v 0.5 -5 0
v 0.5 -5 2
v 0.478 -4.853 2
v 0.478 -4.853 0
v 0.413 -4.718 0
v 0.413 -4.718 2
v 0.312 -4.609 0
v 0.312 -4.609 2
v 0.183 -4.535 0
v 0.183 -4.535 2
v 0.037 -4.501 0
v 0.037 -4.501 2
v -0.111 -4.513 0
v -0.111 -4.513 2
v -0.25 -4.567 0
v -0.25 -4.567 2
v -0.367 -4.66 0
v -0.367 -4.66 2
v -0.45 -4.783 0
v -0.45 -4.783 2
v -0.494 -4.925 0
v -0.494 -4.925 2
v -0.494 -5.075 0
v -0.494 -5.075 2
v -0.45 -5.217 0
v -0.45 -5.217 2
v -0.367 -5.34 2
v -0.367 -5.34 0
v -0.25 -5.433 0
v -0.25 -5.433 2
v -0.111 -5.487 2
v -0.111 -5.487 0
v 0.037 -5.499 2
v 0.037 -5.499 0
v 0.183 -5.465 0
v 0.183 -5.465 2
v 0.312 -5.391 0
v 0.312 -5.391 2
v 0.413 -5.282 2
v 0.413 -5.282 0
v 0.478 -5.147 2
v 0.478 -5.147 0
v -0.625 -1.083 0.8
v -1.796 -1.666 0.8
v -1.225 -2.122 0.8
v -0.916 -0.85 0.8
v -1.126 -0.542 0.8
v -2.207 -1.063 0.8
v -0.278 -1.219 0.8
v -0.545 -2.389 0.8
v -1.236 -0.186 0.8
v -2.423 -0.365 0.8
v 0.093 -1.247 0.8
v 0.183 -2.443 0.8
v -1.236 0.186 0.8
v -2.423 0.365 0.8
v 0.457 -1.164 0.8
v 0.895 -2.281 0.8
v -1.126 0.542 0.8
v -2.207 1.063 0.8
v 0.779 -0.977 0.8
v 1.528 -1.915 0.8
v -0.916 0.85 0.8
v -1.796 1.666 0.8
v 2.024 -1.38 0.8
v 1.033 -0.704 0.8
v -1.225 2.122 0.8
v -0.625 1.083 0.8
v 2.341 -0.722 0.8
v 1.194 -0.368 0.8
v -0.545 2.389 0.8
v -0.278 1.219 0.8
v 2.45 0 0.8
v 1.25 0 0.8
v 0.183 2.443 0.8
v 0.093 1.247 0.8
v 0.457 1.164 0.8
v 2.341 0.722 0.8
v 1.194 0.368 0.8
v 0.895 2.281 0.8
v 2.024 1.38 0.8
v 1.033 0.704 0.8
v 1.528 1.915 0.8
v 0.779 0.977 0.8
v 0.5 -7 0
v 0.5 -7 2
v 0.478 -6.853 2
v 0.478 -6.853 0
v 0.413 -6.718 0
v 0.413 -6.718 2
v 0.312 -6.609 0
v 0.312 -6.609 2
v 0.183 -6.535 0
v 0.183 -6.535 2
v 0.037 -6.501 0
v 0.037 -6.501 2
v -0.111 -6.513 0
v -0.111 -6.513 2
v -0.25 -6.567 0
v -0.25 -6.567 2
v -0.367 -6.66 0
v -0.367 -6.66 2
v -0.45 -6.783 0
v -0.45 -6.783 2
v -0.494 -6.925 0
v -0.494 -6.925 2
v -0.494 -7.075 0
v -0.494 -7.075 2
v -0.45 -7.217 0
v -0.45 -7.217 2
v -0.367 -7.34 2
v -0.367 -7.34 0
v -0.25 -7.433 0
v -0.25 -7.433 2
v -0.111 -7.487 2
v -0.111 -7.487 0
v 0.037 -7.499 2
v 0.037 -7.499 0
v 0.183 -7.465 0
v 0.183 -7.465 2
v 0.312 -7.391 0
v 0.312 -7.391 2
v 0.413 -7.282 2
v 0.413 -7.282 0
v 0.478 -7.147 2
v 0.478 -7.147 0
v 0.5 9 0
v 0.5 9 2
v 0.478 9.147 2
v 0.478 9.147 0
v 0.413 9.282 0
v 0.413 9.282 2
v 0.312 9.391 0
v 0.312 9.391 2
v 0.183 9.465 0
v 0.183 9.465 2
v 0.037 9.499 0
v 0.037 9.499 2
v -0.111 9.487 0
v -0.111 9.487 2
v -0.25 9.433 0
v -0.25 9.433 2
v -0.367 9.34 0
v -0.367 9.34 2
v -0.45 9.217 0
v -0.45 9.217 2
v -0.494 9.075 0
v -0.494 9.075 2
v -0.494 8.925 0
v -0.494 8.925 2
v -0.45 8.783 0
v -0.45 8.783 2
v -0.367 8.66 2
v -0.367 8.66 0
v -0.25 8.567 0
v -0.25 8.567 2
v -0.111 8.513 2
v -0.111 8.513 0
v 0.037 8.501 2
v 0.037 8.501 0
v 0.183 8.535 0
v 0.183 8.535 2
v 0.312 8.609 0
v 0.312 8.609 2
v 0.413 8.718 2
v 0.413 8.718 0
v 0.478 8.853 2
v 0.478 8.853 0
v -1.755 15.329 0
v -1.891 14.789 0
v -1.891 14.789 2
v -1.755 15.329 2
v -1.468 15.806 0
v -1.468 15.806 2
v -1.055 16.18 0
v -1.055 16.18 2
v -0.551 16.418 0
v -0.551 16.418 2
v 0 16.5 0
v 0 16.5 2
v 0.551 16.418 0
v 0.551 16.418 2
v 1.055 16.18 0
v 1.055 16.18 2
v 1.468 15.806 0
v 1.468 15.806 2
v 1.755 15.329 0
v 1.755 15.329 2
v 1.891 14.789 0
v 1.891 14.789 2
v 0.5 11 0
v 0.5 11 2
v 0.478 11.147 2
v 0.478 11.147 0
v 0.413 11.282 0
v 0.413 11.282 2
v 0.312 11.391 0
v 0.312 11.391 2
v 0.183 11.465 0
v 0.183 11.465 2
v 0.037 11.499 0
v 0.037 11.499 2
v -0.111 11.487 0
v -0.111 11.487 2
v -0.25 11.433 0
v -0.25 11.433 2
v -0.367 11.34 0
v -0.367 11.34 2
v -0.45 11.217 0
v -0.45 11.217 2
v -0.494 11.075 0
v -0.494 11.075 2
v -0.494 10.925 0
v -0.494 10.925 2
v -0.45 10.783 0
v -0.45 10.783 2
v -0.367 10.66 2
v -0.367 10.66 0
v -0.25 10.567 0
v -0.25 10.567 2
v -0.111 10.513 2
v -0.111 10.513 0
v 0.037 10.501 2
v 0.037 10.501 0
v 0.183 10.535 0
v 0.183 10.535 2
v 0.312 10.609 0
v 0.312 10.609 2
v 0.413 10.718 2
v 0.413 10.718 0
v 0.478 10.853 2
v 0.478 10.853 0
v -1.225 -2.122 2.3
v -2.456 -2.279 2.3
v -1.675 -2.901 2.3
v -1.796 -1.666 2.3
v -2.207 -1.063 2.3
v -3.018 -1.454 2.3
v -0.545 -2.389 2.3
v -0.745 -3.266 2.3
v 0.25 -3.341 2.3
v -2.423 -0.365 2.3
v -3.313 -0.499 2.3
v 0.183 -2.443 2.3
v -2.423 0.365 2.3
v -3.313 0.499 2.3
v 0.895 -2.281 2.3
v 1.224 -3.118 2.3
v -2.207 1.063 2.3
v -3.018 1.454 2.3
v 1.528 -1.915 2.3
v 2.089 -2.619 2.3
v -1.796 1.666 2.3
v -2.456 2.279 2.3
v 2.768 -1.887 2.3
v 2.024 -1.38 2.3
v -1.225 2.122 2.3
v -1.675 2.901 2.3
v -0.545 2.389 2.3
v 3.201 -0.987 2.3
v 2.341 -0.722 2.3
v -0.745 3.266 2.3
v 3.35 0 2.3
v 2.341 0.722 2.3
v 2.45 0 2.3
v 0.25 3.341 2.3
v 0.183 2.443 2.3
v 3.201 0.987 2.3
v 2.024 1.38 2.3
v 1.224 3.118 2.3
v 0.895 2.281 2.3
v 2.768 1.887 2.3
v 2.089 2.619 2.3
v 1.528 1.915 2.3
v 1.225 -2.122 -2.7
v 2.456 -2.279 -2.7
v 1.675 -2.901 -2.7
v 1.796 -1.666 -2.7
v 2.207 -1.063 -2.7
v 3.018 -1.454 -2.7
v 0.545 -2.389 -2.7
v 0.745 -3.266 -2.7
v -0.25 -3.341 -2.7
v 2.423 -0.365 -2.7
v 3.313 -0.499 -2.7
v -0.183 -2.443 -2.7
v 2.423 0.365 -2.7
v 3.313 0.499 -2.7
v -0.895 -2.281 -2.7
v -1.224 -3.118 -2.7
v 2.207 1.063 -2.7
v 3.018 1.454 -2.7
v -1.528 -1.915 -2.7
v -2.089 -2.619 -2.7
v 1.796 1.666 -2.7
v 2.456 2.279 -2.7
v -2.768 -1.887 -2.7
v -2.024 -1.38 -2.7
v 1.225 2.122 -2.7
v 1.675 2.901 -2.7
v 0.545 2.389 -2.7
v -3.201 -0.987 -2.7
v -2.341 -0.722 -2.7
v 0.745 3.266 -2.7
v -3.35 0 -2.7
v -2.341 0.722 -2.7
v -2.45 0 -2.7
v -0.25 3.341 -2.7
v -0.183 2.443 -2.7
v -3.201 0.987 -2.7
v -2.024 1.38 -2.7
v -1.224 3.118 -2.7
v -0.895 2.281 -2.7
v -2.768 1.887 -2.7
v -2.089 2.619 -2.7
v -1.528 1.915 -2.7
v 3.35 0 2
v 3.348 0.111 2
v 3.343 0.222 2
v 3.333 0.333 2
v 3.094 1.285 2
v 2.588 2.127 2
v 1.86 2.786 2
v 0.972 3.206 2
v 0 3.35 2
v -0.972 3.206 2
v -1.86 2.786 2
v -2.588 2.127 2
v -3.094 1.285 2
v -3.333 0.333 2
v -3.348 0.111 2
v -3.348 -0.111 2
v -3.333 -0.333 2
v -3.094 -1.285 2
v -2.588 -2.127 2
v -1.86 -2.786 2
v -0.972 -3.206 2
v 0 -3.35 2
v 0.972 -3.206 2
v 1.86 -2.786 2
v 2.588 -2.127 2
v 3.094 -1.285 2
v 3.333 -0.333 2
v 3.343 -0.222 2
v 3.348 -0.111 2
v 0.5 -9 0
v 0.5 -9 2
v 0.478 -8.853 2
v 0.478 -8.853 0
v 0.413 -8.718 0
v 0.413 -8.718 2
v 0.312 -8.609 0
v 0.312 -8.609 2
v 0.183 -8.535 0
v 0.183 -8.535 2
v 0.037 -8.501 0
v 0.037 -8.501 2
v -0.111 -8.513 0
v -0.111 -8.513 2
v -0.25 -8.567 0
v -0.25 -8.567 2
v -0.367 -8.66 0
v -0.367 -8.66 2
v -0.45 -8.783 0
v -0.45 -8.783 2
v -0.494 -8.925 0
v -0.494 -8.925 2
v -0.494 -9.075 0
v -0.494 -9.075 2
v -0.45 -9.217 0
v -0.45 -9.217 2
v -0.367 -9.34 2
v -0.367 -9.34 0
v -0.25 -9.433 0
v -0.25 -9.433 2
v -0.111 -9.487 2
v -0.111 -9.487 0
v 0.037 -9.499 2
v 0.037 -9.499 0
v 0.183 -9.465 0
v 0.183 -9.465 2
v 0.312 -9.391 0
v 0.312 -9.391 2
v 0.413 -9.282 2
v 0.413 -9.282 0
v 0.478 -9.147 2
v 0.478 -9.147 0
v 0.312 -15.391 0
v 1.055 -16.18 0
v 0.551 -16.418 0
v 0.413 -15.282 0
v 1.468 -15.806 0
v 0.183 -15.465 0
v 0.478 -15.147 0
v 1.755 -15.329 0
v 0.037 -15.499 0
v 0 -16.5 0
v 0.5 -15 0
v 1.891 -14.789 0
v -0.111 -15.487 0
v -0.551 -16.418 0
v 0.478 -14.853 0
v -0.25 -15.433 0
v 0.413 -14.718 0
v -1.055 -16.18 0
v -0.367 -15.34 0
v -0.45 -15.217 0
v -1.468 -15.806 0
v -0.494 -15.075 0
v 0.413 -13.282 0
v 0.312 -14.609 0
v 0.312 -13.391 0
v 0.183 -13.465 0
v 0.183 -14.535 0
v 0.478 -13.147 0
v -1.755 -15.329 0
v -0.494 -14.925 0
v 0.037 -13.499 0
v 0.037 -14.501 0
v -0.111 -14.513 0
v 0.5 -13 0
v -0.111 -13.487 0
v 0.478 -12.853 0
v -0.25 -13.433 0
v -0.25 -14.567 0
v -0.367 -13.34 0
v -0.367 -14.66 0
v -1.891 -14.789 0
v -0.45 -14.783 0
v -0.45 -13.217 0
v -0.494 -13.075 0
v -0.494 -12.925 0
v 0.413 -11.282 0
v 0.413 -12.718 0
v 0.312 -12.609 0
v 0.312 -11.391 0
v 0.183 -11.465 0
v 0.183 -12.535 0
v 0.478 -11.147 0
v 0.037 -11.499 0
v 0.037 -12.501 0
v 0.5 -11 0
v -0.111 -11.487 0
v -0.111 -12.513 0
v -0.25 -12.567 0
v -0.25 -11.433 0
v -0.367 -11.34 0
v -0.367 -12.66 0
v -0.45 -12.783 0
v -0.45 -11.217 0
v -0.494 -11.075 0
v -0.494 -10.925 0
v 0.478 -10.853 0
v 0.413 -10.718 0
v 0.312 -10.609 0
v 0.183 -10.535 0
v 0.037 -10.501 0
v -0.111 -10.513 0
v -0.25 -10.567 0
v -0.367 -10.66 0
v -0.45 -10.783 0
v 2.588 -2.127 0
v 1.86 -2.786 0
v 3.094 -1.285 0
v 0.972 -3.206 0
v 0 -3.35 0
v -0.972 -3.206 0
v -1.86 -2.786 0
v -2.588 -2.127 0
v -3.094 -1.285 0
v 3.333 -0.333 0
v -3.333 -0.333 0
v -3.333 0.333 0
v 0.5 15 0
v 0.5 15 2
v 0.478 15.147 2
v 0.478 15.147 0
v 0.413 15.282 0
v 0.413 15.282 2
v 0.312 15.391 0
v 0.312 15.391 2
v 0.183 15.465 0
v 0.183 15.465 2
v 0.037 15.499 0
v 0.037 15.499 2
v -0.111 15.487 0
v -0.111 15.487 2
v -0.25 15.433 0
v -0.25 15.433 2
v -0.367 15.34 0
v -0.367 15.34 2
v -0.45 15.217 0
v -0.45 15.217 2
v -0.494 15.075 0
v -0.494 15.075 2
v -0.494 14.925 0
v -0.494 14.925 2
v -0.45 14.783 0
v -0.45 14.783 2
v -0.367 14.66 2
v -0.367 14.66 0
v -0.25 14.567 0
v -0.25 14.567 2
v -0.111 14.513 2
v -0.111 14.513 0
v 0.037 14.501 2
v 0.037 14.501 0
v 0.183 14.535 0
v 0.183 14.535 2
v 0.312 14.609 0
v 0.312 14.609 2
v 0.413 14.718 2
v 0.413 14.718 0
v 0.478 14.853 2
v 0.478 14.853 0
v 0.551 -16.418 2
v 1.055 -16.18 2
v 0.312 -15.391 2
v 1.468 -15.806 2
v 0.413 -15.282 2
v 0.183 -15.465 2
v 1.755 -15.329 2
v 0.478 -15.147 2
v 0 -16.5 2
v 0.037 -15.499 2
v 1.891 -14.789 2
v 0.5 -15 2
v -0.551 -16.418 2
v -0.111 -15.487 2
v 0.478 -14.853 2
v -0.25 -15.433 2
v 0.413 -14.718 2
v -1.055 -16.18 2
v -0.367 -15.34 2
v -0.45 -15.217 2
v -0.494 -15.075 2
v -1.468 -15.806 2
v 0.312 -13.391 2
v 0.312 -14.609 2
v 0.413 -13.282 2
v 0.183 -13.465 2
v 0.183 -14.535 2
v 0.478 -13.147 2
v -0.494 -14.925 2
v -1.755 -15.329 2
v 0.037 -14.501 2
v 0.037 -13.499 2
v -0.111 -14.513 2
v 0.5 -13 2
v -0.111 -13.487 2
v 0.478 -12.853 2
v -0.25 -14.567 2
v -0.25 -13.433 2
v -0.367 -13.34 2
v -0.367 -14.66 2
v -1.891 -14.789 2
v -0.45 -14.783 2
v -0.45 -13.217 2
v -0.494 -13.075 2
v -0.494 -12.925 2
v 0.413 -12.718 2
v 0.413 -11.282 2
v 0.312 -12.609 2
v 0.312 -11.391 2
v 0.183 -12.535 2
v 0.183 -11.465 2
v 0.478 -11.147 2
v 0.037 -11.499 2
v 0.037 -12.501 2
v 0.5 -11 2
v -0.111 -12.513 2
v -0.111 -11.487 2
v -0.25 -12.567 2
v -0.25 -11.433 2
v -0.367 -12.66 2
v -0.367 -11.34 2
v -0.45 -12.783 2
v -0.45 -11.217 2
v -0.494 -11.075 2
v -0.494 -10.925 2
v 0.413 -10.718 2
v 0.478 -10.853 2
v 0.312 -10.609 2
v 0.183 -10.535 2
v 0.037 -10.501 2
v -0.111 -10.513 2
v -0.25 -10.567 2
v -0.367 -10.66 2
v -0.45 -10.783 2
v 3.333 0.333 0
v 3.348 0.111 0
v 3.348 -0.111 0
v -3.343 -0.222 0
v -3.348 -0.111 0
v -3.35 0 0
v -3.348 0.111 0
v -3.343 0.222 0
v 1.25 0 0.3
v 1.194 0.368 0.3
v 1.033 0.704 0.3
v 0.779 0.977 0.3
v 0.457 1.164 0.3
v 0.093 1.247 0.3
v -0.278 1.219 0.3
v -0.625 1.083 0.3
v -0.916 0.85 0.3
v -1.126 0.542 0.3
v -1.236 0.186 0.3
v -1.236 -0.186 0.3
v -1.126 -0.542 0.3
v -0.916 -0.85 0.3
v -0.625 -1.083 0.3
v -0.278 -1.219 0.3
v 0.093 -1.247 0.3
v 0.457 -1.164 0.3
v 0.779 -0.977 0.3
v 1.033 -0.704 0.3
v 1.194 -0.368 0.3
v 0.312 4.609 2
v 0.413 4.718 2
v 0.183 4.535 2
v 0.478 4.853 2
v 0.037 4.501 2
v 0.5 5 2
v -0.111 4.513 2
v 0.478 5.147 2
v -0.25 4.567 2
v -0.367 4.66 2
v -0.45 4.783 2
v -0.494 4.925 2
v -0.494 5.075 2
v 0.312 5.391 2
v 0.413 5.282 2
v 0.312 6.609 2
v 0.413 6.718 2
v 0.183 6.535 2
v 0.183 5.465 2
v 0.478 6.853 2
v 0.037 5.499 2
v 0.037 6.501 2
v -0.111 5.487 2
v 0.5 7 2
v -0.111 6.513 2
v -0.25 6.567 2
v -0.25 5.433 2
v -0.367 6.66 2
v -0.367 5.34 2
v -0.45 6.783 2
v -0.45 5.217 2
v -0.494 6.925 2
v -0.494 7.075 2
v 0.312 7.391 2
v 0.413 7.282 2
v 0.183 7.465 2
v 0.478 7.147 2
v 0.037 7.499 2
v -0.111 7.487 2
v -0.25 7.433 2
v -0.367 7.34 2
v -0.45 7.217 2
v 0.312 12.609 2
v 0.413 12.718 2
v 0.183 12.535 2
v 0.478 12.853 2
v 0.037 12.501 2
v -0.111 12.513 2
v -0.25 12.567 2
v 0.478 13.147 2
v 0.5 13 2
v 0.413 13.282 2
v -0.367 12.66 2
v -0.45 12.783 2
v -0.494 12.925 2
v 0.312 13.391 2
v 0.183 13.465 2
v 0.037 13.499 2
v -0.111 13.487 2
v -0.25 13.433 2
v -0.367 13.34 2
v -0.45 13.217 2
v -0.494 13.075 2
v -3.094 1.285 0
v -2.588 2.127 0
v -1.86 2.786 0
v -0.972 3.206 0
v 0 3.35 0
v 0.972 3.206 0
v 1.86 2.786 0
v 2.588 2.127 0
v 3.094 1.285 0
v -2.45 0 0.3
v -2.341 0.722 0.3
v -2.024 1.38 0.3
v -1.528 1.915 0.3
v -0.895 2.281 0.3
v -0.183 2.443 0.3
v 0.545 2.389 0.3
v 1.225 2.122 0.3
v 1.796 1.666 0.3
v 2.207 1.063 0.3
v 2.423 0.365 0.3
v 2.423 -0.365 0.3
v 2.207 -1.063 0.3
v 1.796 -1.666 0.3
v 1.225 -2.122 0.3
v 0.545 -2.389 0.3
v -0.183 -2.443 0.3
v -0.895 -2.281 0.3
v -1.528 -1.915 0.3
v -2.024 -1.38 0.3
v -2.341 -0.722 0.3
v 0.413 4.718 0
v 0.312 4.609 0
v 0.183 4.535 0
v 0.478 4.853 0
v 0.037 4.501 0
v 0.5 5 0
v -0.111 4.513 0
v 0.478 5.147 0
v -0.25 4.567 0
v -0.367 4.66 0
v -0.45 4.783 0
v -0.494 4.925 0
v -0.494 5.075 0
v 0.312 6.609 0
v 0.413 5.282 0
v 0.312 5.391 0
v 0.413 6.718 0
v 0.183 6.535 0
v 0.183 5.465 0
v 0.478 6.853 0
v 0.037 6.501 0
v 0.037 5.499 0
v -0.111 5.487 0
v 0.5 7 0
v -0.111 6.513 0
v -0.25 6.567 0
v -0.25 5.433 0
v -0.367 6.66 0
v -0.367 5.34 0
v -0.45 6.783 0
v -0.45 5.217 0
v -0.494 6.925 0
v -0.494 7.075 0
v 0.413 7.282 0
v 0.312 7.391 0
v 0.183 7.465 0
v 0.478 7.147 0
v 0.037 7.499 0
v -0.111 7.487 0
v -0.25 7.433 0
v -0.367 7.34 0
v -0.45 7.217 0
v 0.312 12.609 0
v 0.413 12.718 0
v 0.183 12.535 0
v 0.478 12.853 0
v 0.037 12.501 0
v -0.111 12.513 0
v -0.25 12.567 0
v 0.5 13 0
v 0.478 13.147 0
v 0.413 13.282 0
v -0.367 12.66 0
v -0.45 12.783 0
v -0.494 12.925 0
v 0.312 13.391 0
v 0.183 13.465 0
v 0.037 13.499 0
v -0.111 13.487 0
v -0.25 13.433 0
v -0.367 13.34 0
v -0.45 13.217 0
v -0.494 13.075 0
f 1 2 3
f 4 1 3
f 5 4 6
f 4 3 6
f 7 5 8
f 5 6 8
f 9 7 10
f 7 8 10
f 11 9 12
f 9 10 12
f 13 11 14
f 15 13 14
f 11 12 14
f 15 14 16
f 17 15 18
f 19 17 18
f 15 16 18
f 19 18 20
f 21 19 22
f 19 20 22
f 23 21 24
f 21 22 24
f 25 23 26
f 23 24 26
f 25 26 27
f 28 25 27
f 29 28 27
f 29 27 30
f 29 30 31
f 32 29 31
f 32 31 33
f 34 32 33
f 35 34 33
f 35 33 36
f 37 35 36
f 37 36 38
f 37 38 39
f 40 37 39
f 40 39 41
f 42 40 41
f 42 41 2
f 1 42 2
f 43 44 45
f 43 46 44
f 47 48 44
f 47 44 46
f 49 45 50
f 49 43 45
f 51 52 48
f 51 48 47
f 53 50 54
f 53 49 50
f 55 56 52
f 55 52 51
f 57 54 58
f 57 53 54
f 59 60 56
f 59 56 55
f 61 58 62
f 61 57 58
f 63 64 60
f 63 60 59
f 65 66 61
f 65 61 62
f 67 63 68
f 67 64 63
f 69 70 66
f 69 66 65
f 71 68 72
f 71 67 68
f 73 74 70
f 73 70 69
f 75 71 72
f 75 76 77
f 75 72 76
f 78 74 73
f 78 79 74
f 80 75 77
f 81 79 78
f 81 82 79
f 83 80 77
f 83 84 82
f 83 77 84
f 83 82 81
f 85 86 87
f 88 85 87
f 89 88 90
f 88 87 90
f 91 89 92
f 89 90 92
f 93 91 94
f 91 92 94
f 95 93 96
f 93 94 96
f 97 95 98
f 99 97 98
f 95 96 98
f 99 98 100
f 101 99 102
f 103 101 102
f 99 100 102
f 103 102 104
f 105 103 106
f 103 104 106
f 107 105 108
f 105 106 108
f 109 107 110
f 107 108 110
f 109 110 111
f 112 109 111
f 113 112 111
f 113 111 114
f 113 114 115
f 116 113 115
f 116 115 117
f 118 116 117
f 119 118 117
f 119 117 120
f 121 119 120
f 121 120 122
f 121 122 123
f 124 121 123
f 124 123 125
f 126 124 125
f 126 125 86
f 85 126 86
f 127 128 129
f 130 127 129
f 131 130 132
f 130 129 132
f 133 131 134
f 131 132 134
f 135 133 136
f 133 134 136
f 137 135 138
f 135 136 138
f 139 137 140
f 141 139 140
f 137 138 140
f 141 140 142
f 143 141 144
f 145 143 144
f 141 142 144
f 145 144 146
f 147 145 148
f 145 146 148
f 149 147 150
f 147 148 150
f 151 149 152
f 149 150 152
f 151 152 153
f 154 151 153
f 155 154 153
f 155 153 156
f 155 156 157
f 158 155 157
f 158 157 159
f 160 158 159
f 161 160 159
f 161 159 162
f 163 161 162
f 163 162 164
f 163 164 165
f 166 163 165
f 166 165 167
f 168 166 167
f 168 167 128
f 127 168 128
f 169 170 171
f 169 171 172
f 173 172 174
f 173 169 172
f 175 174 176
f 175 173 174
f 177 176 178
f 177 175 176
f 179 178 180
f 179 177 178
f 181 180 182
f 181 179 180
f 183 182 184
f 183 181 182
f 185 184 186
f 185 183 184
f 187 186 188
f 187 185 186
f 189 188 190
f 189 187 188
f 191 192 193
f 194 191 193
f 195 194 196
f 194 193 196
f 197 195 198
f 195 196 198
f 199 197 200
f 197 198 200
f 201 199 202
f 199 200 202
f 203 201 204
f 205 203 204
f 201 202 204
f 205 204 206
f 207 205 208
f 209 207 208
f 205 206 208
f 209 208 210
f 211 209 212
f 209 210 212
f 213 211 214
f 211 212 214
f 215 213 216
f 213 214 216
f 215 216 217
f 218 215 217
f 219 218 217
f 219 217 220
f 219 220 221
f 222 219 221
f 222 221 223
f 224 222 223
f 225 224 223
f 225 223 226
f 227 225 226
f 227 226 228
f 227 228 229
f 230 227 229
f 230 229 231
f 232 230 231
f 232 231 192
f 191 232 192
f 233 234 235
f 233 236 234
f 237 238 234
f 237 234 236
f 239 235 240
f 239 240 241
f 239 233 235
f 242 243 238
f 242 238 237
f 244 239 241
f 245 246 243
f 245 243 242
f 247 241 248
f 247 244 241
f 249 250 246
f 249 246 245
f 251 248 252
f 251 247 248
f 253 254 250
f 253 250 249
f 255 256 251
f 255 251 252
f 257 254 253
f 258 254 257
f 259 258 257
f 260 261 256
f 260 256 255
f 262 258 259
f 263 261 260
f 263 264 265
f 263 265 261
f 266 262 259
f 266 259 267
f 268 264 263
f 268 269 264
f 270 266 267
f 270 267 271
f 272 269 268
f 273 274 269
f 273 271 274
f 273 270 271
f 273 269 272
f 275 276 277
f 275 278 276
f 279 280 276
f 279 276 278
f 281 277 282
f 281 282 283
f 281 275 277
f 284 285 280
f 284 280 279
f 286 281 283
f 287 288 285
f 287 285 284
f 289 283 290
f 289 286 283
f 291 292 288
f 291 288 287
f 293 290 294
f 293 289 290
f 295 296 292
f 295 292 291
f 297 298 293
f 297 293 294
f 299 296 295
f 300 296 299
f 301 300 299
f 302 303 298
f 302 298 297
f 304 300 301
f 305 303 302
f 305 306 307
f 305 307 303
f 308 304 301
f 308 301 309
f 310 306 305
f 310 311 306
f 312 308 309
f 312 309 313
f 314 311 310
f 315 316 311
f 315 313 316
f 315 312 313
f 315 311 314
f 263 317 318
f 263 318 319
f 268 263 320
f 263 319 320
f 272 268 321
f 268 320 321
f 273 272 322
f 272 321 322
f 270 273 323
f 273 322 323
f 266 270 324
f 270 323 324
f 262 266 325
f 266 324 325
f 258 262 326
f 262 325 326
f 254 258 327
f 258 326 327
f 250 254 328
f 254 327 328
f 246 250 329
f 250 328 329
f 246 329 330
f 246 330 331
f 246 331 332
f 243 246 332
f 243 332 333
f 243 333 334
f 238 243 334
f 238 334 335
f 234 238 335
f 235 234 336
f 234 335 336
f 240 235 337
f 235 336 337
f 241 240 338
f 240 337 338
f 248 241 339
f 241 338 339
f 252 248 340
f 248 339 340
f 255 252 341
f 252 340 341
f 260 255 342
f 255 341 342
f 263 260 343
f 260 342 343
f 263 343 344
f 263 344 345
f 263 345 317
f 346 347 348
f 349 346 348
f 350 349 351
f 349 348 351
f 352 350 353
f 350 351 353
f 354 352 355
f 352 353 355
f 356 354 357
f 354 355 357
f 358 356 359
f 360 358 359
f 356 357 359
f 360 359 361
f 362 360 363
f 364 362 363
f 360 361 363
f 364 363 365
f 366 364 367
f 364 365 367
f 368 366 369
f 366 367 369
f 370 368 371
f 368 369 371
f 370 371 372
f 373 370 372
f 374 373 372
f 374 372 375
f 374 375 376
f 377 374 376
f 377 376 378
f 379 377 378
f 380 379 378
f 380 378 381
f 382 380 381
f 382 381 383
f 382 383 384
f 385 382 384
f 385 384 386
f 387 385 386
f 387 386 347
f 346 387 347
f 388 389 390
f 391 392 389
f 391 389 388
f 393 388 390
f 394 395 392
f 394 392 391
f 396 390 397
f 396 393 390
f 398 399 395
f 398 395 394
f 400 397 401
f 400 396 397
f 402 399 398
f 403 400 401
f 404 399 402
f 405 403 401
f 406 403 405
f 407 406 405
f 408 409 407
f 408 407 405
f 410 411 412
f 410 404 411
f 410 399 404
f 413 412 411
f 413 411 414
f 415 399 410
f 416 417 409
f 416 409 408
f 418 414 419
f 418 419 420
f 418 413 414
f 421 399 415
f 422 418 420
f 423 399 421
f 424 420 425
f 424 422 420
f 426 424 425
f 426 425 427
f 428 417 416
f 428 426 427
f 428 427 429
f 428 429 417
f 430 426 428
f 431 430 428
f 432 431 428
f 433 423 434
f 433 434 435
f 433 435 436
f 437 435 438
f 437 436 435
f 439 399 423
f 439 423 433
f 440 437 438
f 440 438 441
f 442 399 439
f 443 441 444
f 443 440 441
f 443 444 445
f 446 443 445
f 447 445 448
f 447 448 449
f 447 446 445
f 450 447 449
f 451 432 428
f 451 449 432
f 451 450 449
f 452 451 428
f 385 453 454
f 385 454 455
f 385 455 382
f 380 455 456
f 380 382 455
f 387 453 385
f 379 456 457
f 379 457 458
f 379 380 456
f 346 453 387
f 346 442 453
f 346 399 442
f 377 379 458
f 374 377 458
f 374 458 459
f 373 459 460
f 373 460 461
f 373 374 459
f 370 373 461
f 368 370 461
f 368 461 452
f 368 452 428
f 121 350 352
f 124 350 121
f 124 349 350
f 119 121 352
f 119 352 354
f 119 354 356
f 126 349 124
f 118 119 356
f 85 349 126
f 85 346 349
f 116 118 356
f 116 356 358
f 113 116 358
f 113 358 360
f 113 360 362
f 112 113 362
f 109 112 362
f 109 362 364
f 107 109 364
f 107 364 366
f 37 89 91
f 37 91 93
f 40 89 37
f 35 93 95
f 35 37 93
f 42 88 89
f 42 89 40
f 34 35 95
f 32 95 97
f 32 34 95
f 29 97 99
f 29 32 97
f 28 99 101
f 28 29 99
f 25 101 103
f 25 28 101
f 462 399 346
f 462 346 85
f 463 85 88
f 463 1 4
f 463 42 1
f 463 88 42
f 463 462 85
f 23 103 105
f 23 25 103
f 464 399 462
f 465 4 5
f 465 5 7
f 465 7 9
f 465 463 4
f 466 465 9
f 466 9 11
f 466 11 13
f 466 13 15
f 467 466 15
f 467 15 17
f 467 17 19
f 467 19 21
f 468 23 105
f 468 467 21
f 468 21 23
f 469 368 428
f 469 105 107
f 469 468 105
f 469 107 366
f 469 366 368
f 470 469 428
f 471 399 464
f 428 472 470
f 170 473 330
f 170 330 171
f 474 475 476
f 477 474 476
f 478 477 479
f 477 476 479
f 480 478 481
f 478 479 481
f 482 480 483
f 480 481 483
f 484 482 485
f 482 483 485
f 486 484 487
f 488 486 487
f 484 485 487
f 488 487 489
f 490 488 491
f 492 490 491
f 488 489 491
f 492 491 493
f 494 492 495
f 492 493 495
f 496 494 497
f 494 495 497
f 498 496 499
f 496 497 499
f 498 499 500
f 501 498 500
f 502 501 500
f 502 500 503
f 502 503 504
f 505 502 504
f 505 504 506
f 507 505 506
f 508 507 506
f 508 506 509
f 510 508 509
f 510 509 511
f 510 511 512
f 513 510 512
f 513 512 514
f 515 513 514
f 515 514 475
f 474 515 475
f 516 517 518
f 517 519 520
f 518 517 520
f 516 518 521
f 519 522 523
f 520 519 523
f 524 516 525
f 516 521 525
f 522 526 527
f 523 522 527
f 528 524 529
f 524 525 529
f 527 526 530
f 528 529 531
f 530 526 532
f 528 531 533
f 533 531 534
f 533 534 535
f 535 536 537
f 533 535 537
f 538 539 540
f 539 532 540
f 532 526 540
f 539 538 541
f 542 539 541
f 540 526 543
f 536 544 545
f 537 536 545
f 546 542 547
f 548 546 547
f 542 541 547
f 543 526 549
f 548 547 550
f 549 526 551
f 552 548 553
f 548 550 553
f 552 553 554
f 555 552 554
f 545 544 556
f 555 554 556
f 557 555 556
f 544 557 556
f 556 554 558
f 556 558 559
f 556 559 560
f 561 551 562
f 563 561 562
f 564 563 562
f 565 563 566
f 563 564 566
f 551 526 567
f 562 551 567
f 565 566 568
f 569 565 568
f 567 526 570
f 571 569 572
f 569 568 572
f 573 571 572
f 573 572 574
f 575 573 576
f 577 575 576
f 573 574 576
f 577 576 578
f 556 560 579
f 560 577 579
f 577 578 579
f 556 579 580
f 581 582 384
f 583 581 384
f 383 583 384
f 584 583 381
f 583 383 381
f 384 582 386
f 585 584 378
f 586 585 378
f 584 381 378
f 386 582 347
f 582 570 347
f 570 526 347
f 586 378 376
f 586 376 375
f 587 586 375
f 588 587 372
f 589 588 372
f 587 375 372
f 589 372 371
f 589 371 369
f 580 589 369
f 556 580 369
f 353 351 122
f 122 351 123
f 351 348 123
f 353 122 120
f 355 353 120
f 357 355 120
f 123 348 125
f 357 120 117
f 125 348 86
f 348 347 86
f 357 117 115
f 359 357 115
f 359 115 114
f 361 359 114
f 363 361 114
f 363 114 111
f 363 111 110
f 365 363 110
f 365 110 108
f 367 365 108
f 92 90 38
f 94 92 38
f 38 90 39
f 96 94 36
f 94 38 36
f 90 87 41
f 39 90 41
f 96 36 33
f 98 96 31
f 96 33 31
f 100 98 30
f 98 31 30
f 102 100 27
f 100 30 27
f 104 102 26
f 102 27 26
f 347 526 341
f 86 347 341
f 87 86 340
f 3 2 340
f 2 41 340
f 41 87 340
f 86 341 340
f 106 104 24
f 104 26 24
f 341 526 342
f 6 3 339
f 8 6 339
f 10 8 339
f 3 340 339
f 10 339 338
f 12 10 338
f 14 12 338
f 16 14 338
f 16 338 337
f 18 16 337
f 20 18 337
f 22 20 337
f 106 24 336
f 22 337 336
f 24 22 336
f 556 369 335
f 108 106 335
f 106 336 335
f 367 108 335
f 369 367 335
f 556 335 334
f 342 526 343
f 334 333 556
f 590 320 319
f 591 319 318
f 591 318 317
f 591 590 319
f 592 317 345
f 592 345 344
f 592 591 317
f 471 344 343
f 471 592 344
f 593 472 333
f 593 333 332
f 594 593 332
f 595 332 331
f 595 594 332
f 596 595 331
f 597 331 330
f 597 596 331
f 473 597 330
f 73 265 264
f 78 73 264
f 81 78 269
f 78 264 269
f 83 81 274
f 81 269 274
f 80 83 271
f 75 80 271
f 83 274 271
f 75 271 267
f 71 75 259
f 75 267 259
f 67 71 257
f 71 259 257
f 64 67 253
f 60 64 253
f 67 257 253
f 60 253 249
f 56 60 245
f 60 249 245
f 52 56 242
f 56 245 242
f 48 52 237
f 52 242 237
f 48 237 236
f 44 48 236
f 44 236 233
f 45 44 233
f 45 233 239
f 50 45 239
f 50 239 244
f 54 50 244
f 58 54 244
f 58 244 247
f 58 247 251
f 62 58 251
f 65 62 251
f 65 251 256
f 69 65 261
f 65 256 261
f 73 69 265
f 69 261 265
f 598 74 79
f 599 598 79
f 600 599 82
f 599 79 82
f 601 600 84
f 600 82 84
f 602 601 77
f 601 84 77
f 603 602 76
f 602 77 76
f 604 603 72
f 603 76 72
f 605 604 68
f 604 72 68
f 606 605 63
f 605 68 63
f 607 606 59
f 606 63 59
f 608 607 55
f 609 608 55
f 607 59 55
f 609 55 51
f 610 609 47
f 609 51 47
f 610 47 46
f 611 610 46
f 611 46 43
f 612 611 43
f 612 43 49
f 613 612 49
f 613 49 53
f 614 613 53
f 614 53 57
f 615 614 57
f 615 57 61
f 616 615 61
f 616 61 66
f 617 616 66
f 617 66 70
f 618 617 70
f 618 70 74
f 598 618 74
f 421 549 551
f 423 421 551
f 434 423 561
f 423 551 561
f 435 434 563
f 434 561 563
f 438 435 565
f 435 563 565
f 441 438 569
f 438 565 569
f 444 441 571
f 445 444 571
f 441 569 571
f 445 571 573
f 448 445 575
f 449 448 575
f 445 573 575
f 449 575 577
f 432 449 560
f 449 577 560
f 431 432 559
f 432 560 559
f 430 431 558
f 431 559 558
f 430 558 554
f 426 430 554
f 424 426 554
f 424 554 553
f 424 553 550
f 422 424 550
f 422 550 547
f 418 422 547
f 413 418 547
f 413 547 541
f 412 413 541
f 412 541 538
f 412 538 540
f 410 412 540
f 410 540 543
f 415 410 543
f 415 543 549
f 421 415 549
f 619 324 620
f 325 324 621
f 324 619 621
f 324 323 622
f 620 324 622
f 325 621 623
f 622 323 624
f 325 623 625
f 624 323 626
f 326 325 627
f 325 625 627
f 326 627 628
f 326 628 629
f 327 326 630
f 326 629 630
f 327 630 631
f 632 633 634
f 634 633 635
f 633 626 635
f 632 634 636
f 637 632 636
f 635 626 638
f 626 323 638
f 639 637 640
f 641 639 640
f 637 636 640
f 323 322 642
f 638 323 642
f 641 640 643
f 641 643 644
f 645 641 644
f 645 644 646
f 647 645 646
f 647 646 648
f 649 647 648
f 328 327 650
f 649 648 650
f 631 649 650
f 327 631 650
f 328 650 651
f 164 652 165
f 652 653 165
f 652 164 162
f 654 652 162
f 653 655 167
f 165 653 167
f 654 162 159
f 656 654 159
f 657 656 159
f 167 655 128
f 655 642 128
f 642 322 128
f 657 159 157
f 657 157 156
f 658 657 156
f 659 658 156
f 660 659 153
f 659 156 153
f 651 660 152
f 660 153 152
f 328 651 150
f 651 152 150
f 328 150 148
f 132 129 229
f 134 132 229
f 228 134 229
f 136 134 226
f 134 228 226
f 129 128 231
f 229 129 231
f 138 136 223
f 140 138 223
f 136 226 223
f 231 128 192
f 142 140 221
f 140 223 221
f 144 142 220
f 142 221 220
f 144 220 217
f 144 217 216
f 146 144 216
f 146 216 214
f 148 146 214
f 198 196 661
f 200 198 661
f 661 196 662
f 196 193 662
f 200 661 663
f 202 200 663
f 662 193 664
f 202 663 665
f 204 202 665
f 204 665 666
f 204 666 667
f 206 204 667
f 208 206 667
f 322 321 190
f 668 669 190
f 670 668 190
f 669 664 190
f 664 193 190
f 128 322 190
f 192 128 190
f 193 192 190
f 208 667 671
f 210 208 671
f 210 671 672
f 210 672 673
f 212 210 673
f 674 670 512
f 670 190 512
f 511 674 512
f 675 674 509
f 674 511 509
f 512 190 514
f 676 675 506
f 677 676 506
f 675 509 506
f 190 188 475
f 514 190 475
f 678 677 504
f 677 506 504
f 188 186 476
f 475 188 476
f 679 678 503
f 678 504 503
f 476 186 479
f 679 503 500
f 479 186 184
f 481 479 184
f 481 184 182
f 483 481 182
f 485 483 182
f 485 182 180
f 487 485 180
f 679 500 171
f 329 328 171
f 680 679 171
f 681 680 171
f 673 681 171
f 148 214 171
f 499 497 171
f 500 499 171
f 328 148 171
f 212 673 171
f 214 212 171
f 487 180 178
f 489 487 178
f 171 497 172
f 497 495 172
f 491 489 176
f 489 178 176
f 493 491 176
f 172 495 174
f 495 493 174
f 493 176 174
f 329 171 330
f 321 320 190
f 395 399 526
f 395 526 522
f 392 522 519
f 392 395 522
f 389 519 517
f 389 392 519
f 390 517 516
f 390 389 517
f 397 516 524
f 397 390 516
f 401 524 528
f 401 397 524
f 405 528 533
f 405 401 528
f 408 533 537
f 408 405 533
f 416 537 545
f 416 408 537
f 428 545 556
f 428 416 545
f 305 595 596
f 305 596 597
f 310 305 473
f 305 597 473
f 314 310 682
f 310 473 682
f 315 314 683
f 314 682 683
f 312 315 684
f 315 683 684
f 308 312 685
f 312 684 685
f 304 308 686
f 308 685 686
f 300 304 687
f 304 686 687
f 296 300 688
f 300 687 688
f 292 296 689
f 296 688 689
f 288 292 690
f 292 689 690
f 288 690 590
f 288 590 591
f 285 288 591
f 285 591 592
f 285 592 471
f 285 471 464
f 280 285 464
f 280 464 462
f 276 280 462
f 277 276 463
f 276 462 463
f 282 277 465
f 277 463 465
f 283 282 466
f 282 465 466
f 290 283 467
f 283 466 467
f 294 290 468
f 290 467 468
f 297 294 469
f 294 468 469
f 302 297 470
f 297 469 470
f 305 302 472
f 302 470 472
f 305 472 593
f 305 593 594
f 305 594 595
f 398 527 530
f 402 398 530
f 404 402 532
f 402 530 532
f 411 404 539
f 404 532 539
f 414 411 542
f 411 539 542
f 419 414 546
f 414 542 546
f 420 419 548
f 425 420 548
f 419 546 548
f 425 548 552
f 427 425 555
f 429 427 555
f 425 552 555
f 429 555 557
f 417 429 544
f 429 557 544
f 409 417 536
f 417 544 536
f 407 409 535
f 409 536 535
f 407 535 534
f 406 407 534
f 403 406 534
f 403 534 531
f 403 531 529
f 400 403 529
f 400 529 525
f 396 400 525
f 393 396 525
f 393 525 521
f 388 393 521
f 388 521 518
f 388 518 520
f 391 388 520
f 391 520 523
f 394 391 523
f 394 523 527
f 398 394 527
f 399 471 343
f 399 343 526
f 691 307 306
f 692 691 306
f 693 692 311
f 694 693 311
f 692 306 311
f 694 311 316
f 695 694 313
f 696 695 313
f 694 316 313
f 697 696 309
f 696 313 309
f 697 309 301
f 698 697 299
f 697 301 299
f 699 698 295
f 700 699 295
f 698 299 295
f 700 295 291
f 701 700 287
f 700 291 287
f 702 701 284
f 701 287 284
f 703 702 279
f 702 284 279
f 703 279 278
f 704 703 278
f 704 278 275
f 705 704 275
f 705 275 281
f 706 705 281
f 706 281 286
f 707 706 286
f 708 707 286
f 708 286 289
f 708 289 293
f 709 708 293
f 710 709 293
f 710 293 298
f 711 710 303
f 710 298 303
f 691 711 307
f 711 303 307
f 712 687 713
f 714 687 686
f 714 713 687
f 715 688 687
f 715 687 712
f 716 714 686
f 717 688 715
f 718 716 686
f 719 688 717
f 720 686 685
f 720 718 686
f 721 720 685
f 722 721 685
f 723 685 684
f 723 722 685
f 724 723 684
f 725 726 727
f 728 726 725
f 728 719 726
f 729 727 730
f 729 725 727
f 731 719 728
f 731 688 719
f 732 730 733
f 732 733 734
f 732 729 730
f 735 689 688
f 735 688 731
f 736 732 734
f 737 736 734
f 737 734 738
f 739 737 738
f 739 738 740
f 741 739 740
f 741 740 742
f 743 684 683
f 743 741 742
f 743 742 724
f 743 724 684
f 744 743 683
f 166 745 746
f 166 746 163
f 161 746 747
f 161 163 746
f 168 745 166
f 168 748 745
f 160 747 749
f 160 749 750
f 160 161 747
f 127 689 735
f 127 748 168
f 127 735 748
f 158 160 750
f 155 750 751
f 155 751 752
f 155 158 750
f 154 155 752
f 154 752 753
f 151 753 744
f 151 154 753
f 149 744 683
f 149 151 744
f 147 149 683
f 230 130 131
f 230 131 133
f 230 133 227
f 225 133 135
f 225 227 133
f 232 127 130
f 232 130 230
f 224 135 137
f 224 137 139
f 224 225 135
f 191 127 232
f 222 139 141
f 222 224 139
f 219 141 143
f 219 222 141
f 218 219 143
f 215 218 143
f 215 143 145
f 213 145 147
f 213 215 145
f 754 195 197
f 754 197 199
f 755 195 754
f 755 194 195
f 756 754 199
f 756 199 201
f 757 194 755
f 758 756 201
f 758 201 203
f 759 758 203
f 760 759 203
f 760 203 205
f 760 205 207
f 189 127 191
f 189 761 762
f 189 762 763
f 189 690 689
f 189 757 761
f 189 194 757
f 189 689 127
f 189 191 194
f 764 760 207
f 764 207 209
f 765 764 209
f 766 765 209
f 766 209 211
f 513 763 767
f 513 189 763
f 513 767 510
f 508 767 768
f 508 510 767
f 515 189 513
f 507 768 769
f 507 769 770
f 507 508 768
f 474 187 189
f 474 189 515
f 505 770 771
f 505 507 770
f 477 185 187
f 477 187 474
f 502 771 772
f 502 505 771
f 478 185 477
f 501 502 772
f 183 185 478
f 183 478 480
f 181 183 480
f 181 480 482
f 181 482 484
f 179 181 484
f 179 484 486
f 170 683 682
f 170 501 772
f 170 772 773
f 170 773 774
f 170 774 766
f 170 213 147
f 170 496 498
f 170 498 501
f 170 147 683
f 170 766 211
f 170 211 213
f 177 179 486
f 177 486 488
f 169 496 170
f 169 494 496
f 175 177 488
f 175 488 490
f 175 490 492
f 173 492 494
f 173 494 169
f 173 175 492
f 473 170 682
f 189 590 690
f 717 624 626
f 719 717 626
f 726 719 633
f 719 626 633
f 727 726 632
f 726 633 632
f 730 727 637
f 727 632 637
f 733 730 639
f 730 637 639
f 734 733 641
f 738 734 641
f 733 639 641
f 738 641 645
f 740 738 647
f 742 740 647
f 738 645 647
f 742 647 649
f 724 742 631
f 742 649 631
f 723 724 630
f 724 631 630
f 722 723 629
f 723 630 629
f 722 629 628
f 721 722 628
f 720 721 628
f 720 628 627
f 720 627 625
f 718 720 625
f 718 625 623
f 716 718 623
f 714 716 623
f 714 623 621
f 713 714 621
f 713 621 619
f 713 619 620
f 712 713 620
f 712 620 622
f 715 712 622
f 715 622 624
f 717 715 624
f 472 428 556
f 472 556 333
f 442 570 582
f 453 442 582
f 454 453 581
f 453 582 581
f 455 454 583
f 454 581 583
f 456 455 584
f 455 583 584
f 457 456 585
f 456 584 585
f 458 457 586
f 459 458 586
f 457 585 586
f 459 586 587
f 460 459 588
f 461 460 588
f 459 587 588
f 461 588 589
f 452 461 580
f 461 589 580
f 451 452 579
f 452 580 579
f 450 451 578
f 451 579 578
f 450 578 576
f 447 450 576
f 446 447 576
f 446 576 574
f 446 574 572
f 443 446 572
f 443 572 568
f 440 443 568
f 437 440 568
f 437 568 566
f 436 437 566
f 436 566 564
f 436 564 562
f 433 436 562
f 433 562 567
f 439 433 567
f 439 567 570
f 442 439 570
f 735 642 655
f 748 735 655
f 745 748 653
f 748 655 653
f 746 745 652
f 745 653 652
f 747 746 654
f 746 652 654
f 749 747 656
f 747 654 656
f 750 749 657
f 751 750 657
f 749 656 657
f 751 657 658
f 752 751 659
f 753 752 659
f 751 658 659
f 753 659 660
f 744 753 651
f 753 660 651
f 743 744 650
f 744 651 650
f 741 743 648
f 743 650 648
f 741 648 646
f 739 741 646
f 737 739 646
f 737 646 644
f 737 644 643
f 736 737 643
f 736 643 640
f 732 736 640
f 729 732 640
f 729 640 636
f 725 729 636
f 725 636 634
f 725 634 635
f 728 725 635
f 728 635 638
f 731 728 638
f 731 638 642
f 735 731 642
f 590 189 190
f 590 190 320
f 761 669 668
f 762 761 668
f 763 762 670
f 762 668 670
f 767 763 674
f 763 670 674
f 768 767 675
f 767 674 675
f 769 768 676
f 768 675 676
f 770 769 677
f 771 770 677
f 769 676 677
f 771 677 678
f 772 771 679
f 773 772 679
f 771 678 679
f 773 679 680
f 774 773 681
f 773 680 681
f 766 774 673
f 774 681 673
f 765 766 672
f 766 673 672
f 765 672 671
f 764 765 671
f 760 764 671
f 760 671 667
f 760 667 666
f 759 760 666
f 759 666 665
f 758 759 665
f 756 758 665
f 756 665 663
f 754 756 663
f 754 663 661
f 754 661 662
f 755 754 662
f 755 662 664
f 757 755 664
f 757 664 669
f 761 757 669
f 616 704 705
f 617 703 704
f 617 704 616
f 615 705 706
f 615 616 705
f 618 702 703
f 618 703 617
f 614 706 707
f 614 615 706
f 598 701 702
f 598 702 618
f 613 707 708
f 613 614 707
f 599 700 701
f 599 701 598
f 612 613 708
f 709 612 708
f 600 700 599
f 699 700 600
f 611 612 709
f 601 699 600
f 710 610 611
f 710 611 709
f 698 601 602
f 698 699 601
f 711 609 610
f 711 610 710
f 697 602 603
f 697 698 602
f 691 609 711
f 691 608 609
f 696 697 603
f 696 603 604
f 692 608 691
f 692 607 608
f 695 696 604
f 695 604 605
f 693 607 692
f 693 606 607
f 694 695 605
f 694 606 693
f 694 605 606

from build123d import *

# Parameters (mm, degrees)
EXTRUDE_1_DEPTH     = 2
SKETCH_2_R          = 3.35
EXTRUDE_2_DEPTH     = 0.3
SKETCH_3_R          = 3.35
EXTRUDE_3_DEPTH     = 2.7
SKETCH_4_R          = 2.45
CUT_EXTRUDE_1_DEPTH = 1.5
SKETCH_5_R          = 1.25
CUT_EXTRUDE_2_DEPTH = 4.5
SKETCH_6_R          = 2.45
CUT_EXTRUDE_3_DEPTH = 3
SKETCH_7_R          = 0.5
CUT_EXTRUDE_4_DEPTH = 5.7


with BuildPart() as part:
    # Эскиз1 → Бобышка-Вытянуть1 (new body)
    with BuildSketch(Plane.XY):
        with BuildLine():
            Line((-3.333438, 0.332705), (-1.890606, 14.788699))
            ThreePointArc((-1.890606, 14.788699), (0, 16.5), (1.890606, 14.788699))
            Line((1.890606, 14.788699), (3.333438, 0.332705))
            ThreePointArc((3.333438, 0.332705), (3.35, 0), (3.333438, -0.332705))
            Line((3.333438, -0.332705), (1.890606, -14.788699))
            ThreePointArc((1.890606, -14.788699), (0, -16.5), (-1.890606, -14.788699))
            Line((-1.890606, -14.788699), (-3.333438, -0.332705))
            ThreePointArc((-3.333438, -0.332705), (-3.35, 0), (-3.333438, 0.332705))
        make_face()
    extrude(amount=EXTRUDE_1_DEPTH)

    # Эскиз2 → Бобышка-Вытянуть2 (add)
    with BuildSketch(Plane.XY.offset(2)):
        Circle(SKETCH_2_R)
    extrude(amount=EXTRUDE_2_DEPTH)

    # Эскиз3 → Бобышка-Вытянуть3 (add)
    with BuildSketch(Plane(origin=(0, 0, 0), x_dir=(-1, 0, 0), z_dir=(0, 0, -1))):
        Circle(SKETCH_3_R)
    extrude(amount=EXTRUDE_3_DEPTH)

    # Эскиз4 → Вырез-Вытянуть1 (cut)
    with BuildSketch(Plane.XY.offset(2.3)):
        Circle(SKETCH_4_R)
    extrude(amount=-CUT_EXTRUDE_1_DEPTH, mode=Mode.SUBTRACT)

    # Эскиз5 → Вырез-Вытянуть2 (cut, through all)
    with BuildSketch(Plane.XY.offset(0.8)):
        Circle(SKETCH_5_R)
    extrude(amount=-CUT_EXTRUDE_2_DEPTH, mode=Mode.SUBTRACT)

    # Эскиз6 → Вырез-Вытянуть3 (cut)
    with BuildSketch(Plane(origin=(0, 0, -2.7), x_dir=(-1, 0, 0), z_dir=(0, 0, -1))):
        Circle(SKETCH_6_R)
    extrude(amount=-CUT_EXTRUDE_3_DEPTH, mode=Mode.SUBTRACT)

    # Эскиз7 → Вырез-Вытянуть4 (cut, through all)
    with BuildSketch(Plane.XY.offset(2)):
        with Locations((0, 15)):
            Circle(SKETCH_7_R)
        with Locations((0, -15)):
            Circle(SKETCH_7_R)
        with Locations((0, -5)):
            Circle(SKETCH_7_R)
        with Locations((0, 5)):
            Circle(SKETCH_7_R)
        with Locations((0, -7)):
            Circle(SKETCH_7_R)
        with Locations((0, 7)):
            Circle(SKETCH_7_R)
        with Locations((0, -9)):
            Circle(SKETCH_7_R)
        with Locations((0, -11)):
            Circle(SKETCH_7_R)
        with Locations((0, 9)):
            Circle(SKETCH_7_R)
        with Locations((0, 11)):
            Circle(SKETCH_7_R)
        with Locations((0, 13)):
            Circle(SKETCH_7_R)
        with Locations((0, -13)):
            Circle(SKETCH_7_R)
    extrude(amount=-CUT_EXTRUDE_4_DEPTH, mode=Mode.SUBTRACT)


solid = part.part
